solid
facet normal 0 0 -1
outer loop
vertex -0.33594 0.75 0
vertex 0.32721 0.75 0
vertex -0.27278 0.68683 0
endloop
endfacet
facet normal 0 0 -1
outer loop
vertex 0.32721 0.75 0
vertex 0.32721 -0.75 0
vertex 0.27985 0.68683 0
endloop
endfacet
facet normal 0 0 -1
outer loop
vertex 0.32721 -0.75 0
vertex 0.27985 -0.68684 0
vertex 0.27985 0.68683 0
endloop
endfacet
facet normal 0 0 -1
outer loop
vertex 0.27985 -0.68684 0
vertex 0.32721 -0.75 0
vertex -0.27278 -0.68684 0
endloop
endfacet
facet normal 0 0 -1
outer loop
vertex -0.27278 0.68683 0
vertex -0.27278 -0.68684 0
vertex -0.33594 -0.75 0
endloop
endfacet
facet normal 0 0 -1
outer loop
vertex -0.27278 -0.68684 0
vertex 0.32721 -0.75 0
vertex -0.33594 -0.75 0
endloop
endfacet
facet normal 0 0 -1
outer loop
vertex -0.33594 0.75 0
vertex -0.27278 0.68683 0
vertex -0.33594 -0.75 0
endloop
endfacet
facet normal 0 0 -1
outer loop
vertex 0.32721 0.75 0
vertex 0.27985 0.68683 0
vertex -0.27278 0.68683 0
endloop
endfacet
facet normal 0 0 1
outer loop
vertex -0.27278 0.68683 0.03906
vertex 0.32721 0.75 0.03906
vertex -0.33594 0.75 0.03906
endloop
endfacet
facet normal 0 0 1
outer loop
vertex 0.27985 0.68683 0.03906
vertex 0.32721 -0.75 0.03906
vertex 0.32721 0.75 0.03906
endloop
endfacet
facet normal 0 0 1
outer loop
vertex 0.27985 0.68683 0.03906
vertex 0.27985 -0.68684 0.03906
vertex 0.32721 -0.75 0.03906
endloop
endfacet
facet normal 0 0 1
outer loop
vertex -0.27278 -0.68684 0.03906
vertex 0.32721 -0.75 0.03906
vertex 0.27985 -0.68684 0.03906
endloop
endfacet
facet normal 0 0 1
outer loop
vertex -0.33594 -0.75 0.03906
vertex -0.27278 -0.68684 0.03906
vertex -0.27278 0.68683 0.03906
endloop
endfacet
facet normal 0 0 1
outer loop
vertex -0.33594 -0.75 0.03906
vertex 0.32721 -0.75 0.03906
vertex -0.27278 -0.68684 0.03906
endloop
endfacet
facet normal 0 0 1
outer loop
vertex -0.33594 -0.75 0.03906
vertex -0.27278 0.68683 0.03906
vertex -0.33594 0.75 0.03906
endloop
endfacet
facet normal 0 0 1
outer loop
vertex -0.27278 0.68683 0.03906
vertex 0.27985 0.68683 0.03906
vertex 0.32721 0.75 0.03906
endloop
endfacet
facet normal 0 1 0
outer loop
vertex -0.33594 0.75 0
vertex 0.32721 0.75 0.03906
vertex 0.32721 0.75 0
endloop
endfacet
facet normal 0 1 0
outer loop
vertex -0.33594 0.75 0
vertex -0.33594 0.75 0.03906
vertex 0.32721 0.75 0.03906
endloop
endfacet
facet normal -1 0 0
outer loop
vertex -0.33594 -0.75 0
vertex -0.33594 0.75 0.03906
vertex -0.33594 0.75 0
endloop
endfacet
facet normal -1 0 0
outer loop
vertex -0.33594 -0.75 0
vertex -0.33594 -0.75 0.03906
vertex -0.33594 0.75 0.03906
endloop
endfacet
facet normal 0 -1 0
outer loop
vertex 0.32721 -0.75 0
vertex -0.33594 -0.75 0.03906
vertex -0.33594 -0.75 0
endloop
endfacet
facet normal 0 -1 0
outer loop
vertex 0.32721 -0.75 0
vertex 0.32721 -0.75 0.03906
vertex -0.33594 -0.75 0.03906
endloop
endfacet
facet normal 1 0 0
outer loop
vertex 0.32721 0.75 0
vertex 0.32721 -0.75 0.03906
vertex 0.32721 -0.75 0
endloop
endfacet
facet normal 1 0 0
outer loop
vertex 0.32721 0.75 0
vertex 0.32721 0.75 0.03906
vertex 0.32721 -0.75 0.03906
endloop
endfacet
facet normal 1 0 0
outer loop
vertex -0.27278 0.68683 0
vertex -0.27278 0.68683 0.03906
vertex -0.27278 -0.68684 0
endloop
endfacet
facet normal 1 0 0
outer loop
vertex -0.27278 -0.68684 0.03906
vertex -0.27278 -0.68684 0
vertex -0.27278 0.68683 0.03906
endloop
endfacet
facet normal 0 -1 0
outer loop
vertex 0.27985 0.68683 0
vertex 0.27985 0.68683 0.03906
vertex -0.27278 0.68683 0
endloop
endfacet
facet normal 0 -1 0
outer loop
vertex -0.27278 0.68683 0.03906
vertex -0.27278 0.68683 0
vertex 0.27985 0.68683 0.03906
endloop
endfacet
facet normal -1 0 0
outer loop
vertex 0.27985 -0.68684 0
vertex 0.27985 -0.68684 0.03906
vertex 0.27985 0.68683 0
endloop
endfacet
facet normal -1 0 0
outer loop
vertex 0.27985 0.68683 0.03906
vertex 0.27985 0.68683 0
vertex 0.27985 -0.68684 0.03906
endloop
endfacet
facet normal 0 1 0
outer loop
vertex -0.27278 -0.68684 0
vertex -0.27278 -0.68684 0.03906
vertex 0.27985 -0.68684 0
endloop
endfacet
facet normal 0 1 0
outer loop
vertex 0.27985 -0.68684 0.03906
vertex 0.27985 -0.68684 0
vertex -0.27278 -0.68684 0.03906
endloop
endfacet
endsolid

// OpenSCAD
EPS = 0.01;

translate([-0.3359375, -0.75, 0.0])
rotate([0, 0, 0])
linear_extrude(height=0.0390625)
difference() {
    union() {
        polygon(points=[[0.6631578947368422, 0.0], [0.6631578947368422, 1.5], [0.0, 1.5], [0.0, 0.0]]);
    }
    translate([0, 0, EPS])
    polygon(points=[[0.6157894736842106, 0.06315789473684211], [0.6157894736842106, 1.436842105263158], [0.06315789473684211, 1.436842105263158], [0.06315789473684211, 0.06315789473684211]]);
}
